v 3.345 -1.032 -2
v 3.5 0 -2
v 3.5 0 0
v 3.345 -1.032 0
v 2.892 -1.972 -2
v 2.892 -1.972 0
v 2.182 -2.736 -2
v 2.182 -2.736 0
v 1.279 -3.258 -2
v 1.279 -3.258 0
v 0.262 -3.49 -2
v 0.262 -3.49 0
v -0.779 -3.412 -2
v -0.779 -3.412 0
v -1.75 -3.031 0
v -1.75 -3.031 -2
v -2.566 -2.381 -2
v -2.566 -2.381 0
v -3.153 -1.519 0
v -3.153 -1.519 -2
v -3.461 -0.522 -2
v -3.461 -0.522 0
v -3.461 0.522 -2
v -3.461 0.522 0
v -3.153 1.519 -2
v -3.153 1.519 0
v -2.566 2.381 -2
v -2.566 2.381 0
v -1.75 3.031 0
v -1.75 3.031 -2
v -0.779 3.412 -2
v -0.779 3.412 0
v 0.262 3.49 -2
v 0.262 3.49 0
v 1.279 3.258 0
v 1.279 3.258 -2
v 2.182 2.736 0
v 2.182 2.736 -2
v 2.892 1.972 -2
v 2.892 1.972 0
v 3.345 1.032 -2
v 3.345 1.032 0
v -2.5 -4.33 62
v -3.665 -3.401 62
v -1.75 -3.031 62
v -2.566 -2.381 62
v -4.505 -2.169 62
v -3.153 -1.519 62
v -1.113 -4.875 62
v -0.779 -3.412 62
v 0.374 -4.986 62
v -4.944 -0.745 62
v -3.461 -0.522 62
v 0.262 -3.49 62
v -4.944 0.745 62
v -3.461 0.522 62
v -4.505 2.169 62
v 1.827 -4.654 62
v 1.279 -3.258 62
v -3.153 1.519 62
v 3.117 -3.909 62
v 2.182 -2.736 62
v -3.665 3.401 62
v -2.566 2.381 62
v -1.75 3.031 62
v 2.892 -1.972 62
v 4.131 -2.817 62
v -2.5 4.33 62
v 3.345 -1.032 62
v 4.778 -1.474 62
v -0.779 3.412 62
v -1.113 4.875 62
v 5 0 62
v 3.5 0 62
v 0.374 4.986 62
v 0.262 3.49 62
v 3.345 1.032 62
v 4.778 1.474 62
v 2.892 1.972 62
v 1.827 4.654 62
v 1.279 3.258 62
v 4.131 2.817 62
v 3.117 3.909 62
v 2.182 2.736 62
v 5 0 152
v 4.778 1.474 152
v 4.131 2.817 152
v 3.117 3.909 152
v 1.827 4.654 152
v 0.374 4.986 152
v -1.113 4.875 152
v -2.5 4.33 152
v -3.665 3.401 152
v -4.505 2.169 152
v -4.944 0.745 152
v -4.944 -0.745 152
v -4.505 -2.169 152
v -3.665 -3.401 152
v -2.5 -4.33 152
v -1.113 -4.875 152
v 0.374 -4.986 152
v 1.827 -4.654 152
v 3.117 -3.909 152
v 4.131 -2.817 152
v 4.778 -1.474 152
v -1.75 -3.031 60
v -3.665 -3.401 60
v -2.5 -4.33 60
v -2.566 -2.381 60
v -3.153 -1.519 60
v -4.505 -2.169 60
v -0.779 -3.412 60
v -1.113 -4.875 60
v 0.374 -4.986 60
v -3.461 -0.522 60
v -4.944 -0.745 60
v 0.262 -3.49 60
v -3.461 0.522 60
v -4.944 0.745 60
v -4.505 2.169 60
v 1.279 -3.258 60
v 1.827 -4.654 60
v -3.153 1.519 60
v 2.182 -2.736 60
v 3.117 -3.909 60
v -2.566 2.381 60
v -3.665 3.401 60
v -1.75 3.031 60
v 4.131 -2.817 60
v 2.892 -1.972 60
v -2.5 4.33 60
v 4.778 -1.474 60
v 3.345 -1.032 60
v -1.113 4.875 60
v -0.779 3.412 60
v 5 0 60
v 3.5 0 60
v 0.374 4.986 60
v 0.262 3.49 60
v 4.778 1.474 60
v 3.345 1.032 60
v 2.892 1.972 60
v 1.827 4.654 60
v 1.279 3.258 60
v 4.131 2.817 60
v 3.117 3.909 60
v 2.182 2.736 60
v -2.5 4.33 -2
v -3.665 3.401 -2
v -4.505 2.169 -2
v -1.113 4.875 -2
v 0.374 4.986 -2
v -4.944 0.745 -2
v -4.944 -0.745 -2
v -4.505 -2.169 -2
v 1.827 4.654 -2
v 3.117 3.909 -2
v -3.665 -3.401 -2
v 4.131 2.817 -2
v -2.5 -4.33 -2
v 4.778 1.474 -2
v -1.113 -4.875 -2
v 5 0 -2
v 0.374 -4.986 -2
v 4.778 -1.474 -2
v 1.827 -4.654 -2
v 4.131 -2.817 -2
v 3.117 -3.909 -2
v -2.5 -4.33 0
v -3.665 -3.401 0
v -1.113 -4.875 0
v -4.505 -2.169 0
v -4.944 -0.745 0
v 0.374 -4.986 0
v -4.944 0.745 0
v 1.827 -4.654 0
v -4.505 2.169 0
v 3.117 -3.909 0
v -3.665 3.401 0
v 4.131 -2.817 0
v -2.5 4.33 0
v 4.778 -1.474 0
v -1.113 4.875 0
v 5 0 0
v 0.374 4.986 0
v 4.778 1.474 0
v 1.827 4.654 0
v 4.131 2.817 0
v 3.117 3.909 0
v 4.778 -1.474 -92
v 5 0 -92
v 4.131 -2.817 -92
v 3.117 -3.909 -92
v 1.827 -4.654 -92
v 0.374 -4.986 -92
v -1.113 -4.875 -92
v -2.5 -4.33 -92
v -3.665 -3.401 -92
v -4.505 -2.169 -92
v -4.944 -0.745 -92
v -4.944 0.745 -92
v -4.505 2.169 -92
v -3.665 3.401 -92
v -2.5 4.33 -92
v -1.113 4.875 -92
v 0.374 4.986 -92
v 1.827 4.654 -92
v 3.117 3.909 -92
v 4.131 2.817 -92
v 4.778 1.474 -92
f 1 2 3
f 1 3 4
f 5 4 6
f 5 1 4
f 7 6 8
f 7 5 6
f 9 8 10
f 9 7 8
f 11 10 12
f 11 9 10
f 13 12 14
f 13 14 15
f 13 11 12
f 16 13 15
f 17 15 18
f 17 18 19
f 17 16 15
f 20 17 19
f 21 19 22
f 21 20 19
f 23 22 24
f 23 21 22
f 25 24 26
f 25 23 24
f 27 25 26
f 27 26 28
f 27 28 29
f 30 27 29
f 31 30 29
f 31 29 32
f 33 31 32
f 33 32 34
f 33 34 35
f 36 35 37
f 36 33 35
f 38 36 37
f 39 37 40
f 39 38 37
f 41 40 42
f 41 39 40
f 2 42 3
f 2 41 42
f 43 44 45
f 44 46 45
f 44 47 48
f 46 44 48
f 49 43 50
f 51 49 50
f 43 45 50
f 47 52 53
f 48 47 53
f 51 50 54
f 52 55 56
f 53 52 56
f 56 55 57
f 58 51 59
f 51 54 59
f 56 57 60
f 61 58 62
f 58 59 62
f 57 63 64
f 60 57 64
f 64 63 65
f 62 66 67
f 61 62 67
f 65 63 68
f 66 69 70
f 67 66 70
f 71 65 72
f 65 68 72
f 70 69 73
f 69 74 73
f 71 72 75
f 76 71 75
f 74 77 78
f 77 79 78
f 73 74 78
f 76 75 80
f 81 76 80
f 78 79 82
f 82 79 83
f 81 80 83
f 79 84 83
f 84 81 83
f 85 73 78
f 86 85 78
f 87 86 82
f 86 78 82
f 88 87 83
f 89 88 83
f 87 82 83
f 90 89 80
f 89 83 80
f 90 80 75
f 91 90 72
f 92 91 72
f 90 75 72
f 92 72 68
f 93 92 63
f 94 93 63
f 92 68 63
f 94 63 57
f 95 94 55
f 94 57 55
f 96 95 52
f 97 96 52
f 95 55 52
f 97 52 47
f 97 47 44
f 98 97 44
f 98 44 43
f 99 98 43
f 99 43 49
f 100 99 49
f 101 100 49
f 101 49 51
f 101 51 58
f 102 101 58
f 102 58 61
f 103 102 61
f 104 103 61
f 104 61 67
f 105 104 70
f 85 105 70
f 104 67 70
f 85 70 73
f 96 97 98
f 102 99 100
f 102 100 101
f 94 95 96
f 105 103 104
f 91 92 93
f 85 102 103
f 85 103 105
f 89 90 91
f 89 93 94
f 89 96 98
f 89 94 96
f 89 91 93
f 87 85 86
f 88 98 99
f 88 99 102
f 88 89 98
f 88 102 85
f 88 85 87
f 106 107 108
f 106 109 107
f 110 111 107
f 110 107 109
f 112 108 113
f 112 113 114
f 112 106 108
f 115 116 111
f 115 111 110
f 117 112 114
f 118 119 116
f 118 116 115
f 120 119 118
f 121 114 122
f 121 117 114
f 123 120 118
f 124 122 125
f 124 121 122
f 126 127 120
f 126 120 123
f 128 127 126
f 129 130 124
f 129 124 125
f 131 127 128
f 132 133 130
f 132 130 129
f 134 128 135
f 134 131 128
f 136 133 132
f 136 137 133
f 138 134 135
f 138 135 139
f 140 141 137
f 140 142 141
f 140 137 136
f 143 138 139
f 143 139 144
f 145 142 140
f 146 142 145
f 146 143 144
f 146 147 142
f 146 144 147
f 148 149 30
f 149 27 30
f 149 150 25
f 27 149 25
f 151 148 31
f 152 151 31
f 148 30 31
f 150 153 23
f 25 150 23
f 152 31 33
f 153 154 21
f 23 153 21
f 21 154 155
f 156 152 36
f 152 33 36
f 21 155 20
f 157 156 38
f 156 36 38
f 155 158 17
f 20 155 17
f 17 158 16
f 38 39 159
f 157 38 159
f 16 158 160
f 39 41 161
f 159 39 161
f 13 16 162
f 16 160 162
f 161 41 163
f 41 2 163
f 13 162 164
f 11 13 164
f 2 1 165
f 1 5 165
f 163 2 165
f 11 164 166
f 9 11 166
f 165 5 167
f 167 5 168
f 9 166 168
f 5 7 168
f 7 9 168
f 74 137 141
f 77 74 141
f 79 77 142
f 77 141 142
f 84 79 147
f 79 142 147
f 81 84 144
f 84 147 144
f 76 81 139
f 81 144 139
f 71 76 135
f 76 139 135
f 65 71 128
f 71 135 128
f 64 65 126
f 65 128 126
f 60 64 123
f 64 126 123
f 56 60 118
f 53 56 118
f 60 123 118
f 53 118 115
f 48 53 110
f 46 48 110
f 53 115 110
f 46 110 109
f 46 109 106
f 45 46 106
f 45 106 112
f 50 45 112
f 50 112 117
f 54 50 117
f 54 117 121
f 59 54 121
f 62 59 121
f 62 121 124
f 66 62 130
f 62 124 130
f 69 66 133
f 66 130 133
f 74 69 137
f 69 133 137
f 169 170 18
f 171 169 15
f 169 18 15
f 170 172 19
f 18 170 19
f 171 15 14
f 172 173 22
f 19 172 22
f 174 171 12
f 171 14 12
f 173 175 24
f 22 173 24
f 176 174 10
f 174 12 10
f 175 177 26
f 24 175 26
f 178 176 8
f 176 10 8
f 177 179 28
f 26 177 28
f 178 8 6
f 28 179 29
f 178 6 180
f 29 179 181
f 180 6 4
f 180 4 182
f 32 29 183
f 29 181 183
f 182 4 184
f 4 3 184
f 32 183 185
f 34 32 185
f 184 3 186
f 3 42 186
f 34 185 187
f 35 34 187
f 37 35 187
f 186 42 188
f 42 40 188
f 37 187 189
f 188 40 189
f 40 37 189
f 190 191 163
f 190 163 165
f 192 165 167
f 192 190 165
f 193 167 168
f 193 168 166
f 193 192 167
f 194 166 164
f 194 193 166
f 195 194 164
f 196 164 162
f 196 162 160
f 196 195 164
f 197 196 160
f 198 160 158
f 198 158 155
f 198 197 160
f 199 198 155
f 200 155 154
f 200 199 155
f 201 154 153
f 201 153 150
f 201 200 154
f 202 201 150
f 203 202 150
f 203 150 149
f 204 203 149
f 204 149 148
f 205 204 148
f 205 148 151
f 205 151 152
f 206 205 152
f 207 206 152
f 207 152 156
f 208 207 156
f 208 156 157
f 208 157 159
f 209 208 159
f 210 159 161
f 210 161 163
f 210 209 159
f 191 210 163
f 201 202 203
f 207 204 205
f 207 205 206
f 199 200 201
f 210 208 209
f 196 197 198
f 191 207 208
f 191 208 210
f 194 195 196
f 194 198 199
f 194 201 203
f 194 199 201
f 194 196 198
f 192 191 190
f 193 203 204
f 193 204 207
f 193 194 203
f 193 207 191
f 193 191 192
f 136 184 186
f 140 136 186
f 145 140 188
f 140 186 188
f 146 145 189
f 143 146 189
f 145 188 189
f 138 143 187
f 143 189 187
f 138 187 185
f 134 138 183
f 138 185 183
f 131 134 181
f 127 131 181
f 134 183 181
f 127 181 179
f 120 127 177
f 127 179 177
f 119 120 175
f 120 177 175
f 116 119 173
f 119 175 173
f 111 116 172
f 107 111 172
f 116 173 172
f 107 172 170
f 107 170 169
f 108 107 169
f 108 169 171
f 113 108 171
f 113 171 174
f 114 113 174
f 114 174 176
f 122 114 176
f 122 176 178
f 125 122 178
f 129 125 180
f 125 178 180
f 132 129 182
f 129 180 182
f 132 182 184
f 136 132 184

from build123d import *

# Parameters (mm, degrees)
SKETCH_1_R      = 5
EXTRUDE_1_DEPTH = 60
SKETCH_2_R      = 3.5
EXTRUDE_2_DEPTH = 2
EXTRUDE_START   = 2
SKETCH_3_R      = 3.5
EXTRUDE_3_DEPTH = 2
EXTRUDE_START_2 = 90
SKETCH_4_R      = 5
EXTRUDE_4_DEPTH = 90
SKETCH_5_R      = 5
EXTRUDE_5_DEPTH = 90


with BuildPart() as part:
    # 草图1 → 凸台-拉伸1 (new body)
    with BuildSketch(Plane.XY):
        Circle(SKETCH_1_R)
    extrude(amount=EXTRUDE_1_DEPTH)

    # 草图2 → 凸台-拉伸2 (add)
    with BuildSketch(Plane.XY.offset(60)):
        Circle(SKETCH_2_R)
    extrude(amount=EXTRUDE_2_DEPTH)

    # 草图3 → 凸台-拉伸3 (add)
    with BuildSketch(Plane(origin=(0, 0, 0), x_dir=(-1, 0, 0), z_dir=(0, 0, -1)).offset(EXTRUDE_START)):
        with Locations(Location((0, 0, 0), (0, 0, 180))):
            Circle(SKETCH_3_R)
    extrude(amount=-EXTRUDE_3_DEPTH)

    # 草图4 → 凸台-拉伸4 (add)
    with BuildSketch(Plane(origin=(0, 0, -2), x_dir=(-1, 0, 0), z_dir=(0, 0, -1)).offset(EXTRUDE_START_2)):
        with Locations(Location((0, 0, 0), (0, 0, 180))):
            Circle(SKETCH_4_R)
    extrude(amount=-EXTRUDE_4_DEPTH)

    # 草图5 → 凸台-拉伸5 (add)
    with BuildSketch(Plane.XY.offset(62)):
        Circle(SKETCH_5_R)
    extrude(amount=EXTRUDE_5_DEPTH)


solid = part.part
